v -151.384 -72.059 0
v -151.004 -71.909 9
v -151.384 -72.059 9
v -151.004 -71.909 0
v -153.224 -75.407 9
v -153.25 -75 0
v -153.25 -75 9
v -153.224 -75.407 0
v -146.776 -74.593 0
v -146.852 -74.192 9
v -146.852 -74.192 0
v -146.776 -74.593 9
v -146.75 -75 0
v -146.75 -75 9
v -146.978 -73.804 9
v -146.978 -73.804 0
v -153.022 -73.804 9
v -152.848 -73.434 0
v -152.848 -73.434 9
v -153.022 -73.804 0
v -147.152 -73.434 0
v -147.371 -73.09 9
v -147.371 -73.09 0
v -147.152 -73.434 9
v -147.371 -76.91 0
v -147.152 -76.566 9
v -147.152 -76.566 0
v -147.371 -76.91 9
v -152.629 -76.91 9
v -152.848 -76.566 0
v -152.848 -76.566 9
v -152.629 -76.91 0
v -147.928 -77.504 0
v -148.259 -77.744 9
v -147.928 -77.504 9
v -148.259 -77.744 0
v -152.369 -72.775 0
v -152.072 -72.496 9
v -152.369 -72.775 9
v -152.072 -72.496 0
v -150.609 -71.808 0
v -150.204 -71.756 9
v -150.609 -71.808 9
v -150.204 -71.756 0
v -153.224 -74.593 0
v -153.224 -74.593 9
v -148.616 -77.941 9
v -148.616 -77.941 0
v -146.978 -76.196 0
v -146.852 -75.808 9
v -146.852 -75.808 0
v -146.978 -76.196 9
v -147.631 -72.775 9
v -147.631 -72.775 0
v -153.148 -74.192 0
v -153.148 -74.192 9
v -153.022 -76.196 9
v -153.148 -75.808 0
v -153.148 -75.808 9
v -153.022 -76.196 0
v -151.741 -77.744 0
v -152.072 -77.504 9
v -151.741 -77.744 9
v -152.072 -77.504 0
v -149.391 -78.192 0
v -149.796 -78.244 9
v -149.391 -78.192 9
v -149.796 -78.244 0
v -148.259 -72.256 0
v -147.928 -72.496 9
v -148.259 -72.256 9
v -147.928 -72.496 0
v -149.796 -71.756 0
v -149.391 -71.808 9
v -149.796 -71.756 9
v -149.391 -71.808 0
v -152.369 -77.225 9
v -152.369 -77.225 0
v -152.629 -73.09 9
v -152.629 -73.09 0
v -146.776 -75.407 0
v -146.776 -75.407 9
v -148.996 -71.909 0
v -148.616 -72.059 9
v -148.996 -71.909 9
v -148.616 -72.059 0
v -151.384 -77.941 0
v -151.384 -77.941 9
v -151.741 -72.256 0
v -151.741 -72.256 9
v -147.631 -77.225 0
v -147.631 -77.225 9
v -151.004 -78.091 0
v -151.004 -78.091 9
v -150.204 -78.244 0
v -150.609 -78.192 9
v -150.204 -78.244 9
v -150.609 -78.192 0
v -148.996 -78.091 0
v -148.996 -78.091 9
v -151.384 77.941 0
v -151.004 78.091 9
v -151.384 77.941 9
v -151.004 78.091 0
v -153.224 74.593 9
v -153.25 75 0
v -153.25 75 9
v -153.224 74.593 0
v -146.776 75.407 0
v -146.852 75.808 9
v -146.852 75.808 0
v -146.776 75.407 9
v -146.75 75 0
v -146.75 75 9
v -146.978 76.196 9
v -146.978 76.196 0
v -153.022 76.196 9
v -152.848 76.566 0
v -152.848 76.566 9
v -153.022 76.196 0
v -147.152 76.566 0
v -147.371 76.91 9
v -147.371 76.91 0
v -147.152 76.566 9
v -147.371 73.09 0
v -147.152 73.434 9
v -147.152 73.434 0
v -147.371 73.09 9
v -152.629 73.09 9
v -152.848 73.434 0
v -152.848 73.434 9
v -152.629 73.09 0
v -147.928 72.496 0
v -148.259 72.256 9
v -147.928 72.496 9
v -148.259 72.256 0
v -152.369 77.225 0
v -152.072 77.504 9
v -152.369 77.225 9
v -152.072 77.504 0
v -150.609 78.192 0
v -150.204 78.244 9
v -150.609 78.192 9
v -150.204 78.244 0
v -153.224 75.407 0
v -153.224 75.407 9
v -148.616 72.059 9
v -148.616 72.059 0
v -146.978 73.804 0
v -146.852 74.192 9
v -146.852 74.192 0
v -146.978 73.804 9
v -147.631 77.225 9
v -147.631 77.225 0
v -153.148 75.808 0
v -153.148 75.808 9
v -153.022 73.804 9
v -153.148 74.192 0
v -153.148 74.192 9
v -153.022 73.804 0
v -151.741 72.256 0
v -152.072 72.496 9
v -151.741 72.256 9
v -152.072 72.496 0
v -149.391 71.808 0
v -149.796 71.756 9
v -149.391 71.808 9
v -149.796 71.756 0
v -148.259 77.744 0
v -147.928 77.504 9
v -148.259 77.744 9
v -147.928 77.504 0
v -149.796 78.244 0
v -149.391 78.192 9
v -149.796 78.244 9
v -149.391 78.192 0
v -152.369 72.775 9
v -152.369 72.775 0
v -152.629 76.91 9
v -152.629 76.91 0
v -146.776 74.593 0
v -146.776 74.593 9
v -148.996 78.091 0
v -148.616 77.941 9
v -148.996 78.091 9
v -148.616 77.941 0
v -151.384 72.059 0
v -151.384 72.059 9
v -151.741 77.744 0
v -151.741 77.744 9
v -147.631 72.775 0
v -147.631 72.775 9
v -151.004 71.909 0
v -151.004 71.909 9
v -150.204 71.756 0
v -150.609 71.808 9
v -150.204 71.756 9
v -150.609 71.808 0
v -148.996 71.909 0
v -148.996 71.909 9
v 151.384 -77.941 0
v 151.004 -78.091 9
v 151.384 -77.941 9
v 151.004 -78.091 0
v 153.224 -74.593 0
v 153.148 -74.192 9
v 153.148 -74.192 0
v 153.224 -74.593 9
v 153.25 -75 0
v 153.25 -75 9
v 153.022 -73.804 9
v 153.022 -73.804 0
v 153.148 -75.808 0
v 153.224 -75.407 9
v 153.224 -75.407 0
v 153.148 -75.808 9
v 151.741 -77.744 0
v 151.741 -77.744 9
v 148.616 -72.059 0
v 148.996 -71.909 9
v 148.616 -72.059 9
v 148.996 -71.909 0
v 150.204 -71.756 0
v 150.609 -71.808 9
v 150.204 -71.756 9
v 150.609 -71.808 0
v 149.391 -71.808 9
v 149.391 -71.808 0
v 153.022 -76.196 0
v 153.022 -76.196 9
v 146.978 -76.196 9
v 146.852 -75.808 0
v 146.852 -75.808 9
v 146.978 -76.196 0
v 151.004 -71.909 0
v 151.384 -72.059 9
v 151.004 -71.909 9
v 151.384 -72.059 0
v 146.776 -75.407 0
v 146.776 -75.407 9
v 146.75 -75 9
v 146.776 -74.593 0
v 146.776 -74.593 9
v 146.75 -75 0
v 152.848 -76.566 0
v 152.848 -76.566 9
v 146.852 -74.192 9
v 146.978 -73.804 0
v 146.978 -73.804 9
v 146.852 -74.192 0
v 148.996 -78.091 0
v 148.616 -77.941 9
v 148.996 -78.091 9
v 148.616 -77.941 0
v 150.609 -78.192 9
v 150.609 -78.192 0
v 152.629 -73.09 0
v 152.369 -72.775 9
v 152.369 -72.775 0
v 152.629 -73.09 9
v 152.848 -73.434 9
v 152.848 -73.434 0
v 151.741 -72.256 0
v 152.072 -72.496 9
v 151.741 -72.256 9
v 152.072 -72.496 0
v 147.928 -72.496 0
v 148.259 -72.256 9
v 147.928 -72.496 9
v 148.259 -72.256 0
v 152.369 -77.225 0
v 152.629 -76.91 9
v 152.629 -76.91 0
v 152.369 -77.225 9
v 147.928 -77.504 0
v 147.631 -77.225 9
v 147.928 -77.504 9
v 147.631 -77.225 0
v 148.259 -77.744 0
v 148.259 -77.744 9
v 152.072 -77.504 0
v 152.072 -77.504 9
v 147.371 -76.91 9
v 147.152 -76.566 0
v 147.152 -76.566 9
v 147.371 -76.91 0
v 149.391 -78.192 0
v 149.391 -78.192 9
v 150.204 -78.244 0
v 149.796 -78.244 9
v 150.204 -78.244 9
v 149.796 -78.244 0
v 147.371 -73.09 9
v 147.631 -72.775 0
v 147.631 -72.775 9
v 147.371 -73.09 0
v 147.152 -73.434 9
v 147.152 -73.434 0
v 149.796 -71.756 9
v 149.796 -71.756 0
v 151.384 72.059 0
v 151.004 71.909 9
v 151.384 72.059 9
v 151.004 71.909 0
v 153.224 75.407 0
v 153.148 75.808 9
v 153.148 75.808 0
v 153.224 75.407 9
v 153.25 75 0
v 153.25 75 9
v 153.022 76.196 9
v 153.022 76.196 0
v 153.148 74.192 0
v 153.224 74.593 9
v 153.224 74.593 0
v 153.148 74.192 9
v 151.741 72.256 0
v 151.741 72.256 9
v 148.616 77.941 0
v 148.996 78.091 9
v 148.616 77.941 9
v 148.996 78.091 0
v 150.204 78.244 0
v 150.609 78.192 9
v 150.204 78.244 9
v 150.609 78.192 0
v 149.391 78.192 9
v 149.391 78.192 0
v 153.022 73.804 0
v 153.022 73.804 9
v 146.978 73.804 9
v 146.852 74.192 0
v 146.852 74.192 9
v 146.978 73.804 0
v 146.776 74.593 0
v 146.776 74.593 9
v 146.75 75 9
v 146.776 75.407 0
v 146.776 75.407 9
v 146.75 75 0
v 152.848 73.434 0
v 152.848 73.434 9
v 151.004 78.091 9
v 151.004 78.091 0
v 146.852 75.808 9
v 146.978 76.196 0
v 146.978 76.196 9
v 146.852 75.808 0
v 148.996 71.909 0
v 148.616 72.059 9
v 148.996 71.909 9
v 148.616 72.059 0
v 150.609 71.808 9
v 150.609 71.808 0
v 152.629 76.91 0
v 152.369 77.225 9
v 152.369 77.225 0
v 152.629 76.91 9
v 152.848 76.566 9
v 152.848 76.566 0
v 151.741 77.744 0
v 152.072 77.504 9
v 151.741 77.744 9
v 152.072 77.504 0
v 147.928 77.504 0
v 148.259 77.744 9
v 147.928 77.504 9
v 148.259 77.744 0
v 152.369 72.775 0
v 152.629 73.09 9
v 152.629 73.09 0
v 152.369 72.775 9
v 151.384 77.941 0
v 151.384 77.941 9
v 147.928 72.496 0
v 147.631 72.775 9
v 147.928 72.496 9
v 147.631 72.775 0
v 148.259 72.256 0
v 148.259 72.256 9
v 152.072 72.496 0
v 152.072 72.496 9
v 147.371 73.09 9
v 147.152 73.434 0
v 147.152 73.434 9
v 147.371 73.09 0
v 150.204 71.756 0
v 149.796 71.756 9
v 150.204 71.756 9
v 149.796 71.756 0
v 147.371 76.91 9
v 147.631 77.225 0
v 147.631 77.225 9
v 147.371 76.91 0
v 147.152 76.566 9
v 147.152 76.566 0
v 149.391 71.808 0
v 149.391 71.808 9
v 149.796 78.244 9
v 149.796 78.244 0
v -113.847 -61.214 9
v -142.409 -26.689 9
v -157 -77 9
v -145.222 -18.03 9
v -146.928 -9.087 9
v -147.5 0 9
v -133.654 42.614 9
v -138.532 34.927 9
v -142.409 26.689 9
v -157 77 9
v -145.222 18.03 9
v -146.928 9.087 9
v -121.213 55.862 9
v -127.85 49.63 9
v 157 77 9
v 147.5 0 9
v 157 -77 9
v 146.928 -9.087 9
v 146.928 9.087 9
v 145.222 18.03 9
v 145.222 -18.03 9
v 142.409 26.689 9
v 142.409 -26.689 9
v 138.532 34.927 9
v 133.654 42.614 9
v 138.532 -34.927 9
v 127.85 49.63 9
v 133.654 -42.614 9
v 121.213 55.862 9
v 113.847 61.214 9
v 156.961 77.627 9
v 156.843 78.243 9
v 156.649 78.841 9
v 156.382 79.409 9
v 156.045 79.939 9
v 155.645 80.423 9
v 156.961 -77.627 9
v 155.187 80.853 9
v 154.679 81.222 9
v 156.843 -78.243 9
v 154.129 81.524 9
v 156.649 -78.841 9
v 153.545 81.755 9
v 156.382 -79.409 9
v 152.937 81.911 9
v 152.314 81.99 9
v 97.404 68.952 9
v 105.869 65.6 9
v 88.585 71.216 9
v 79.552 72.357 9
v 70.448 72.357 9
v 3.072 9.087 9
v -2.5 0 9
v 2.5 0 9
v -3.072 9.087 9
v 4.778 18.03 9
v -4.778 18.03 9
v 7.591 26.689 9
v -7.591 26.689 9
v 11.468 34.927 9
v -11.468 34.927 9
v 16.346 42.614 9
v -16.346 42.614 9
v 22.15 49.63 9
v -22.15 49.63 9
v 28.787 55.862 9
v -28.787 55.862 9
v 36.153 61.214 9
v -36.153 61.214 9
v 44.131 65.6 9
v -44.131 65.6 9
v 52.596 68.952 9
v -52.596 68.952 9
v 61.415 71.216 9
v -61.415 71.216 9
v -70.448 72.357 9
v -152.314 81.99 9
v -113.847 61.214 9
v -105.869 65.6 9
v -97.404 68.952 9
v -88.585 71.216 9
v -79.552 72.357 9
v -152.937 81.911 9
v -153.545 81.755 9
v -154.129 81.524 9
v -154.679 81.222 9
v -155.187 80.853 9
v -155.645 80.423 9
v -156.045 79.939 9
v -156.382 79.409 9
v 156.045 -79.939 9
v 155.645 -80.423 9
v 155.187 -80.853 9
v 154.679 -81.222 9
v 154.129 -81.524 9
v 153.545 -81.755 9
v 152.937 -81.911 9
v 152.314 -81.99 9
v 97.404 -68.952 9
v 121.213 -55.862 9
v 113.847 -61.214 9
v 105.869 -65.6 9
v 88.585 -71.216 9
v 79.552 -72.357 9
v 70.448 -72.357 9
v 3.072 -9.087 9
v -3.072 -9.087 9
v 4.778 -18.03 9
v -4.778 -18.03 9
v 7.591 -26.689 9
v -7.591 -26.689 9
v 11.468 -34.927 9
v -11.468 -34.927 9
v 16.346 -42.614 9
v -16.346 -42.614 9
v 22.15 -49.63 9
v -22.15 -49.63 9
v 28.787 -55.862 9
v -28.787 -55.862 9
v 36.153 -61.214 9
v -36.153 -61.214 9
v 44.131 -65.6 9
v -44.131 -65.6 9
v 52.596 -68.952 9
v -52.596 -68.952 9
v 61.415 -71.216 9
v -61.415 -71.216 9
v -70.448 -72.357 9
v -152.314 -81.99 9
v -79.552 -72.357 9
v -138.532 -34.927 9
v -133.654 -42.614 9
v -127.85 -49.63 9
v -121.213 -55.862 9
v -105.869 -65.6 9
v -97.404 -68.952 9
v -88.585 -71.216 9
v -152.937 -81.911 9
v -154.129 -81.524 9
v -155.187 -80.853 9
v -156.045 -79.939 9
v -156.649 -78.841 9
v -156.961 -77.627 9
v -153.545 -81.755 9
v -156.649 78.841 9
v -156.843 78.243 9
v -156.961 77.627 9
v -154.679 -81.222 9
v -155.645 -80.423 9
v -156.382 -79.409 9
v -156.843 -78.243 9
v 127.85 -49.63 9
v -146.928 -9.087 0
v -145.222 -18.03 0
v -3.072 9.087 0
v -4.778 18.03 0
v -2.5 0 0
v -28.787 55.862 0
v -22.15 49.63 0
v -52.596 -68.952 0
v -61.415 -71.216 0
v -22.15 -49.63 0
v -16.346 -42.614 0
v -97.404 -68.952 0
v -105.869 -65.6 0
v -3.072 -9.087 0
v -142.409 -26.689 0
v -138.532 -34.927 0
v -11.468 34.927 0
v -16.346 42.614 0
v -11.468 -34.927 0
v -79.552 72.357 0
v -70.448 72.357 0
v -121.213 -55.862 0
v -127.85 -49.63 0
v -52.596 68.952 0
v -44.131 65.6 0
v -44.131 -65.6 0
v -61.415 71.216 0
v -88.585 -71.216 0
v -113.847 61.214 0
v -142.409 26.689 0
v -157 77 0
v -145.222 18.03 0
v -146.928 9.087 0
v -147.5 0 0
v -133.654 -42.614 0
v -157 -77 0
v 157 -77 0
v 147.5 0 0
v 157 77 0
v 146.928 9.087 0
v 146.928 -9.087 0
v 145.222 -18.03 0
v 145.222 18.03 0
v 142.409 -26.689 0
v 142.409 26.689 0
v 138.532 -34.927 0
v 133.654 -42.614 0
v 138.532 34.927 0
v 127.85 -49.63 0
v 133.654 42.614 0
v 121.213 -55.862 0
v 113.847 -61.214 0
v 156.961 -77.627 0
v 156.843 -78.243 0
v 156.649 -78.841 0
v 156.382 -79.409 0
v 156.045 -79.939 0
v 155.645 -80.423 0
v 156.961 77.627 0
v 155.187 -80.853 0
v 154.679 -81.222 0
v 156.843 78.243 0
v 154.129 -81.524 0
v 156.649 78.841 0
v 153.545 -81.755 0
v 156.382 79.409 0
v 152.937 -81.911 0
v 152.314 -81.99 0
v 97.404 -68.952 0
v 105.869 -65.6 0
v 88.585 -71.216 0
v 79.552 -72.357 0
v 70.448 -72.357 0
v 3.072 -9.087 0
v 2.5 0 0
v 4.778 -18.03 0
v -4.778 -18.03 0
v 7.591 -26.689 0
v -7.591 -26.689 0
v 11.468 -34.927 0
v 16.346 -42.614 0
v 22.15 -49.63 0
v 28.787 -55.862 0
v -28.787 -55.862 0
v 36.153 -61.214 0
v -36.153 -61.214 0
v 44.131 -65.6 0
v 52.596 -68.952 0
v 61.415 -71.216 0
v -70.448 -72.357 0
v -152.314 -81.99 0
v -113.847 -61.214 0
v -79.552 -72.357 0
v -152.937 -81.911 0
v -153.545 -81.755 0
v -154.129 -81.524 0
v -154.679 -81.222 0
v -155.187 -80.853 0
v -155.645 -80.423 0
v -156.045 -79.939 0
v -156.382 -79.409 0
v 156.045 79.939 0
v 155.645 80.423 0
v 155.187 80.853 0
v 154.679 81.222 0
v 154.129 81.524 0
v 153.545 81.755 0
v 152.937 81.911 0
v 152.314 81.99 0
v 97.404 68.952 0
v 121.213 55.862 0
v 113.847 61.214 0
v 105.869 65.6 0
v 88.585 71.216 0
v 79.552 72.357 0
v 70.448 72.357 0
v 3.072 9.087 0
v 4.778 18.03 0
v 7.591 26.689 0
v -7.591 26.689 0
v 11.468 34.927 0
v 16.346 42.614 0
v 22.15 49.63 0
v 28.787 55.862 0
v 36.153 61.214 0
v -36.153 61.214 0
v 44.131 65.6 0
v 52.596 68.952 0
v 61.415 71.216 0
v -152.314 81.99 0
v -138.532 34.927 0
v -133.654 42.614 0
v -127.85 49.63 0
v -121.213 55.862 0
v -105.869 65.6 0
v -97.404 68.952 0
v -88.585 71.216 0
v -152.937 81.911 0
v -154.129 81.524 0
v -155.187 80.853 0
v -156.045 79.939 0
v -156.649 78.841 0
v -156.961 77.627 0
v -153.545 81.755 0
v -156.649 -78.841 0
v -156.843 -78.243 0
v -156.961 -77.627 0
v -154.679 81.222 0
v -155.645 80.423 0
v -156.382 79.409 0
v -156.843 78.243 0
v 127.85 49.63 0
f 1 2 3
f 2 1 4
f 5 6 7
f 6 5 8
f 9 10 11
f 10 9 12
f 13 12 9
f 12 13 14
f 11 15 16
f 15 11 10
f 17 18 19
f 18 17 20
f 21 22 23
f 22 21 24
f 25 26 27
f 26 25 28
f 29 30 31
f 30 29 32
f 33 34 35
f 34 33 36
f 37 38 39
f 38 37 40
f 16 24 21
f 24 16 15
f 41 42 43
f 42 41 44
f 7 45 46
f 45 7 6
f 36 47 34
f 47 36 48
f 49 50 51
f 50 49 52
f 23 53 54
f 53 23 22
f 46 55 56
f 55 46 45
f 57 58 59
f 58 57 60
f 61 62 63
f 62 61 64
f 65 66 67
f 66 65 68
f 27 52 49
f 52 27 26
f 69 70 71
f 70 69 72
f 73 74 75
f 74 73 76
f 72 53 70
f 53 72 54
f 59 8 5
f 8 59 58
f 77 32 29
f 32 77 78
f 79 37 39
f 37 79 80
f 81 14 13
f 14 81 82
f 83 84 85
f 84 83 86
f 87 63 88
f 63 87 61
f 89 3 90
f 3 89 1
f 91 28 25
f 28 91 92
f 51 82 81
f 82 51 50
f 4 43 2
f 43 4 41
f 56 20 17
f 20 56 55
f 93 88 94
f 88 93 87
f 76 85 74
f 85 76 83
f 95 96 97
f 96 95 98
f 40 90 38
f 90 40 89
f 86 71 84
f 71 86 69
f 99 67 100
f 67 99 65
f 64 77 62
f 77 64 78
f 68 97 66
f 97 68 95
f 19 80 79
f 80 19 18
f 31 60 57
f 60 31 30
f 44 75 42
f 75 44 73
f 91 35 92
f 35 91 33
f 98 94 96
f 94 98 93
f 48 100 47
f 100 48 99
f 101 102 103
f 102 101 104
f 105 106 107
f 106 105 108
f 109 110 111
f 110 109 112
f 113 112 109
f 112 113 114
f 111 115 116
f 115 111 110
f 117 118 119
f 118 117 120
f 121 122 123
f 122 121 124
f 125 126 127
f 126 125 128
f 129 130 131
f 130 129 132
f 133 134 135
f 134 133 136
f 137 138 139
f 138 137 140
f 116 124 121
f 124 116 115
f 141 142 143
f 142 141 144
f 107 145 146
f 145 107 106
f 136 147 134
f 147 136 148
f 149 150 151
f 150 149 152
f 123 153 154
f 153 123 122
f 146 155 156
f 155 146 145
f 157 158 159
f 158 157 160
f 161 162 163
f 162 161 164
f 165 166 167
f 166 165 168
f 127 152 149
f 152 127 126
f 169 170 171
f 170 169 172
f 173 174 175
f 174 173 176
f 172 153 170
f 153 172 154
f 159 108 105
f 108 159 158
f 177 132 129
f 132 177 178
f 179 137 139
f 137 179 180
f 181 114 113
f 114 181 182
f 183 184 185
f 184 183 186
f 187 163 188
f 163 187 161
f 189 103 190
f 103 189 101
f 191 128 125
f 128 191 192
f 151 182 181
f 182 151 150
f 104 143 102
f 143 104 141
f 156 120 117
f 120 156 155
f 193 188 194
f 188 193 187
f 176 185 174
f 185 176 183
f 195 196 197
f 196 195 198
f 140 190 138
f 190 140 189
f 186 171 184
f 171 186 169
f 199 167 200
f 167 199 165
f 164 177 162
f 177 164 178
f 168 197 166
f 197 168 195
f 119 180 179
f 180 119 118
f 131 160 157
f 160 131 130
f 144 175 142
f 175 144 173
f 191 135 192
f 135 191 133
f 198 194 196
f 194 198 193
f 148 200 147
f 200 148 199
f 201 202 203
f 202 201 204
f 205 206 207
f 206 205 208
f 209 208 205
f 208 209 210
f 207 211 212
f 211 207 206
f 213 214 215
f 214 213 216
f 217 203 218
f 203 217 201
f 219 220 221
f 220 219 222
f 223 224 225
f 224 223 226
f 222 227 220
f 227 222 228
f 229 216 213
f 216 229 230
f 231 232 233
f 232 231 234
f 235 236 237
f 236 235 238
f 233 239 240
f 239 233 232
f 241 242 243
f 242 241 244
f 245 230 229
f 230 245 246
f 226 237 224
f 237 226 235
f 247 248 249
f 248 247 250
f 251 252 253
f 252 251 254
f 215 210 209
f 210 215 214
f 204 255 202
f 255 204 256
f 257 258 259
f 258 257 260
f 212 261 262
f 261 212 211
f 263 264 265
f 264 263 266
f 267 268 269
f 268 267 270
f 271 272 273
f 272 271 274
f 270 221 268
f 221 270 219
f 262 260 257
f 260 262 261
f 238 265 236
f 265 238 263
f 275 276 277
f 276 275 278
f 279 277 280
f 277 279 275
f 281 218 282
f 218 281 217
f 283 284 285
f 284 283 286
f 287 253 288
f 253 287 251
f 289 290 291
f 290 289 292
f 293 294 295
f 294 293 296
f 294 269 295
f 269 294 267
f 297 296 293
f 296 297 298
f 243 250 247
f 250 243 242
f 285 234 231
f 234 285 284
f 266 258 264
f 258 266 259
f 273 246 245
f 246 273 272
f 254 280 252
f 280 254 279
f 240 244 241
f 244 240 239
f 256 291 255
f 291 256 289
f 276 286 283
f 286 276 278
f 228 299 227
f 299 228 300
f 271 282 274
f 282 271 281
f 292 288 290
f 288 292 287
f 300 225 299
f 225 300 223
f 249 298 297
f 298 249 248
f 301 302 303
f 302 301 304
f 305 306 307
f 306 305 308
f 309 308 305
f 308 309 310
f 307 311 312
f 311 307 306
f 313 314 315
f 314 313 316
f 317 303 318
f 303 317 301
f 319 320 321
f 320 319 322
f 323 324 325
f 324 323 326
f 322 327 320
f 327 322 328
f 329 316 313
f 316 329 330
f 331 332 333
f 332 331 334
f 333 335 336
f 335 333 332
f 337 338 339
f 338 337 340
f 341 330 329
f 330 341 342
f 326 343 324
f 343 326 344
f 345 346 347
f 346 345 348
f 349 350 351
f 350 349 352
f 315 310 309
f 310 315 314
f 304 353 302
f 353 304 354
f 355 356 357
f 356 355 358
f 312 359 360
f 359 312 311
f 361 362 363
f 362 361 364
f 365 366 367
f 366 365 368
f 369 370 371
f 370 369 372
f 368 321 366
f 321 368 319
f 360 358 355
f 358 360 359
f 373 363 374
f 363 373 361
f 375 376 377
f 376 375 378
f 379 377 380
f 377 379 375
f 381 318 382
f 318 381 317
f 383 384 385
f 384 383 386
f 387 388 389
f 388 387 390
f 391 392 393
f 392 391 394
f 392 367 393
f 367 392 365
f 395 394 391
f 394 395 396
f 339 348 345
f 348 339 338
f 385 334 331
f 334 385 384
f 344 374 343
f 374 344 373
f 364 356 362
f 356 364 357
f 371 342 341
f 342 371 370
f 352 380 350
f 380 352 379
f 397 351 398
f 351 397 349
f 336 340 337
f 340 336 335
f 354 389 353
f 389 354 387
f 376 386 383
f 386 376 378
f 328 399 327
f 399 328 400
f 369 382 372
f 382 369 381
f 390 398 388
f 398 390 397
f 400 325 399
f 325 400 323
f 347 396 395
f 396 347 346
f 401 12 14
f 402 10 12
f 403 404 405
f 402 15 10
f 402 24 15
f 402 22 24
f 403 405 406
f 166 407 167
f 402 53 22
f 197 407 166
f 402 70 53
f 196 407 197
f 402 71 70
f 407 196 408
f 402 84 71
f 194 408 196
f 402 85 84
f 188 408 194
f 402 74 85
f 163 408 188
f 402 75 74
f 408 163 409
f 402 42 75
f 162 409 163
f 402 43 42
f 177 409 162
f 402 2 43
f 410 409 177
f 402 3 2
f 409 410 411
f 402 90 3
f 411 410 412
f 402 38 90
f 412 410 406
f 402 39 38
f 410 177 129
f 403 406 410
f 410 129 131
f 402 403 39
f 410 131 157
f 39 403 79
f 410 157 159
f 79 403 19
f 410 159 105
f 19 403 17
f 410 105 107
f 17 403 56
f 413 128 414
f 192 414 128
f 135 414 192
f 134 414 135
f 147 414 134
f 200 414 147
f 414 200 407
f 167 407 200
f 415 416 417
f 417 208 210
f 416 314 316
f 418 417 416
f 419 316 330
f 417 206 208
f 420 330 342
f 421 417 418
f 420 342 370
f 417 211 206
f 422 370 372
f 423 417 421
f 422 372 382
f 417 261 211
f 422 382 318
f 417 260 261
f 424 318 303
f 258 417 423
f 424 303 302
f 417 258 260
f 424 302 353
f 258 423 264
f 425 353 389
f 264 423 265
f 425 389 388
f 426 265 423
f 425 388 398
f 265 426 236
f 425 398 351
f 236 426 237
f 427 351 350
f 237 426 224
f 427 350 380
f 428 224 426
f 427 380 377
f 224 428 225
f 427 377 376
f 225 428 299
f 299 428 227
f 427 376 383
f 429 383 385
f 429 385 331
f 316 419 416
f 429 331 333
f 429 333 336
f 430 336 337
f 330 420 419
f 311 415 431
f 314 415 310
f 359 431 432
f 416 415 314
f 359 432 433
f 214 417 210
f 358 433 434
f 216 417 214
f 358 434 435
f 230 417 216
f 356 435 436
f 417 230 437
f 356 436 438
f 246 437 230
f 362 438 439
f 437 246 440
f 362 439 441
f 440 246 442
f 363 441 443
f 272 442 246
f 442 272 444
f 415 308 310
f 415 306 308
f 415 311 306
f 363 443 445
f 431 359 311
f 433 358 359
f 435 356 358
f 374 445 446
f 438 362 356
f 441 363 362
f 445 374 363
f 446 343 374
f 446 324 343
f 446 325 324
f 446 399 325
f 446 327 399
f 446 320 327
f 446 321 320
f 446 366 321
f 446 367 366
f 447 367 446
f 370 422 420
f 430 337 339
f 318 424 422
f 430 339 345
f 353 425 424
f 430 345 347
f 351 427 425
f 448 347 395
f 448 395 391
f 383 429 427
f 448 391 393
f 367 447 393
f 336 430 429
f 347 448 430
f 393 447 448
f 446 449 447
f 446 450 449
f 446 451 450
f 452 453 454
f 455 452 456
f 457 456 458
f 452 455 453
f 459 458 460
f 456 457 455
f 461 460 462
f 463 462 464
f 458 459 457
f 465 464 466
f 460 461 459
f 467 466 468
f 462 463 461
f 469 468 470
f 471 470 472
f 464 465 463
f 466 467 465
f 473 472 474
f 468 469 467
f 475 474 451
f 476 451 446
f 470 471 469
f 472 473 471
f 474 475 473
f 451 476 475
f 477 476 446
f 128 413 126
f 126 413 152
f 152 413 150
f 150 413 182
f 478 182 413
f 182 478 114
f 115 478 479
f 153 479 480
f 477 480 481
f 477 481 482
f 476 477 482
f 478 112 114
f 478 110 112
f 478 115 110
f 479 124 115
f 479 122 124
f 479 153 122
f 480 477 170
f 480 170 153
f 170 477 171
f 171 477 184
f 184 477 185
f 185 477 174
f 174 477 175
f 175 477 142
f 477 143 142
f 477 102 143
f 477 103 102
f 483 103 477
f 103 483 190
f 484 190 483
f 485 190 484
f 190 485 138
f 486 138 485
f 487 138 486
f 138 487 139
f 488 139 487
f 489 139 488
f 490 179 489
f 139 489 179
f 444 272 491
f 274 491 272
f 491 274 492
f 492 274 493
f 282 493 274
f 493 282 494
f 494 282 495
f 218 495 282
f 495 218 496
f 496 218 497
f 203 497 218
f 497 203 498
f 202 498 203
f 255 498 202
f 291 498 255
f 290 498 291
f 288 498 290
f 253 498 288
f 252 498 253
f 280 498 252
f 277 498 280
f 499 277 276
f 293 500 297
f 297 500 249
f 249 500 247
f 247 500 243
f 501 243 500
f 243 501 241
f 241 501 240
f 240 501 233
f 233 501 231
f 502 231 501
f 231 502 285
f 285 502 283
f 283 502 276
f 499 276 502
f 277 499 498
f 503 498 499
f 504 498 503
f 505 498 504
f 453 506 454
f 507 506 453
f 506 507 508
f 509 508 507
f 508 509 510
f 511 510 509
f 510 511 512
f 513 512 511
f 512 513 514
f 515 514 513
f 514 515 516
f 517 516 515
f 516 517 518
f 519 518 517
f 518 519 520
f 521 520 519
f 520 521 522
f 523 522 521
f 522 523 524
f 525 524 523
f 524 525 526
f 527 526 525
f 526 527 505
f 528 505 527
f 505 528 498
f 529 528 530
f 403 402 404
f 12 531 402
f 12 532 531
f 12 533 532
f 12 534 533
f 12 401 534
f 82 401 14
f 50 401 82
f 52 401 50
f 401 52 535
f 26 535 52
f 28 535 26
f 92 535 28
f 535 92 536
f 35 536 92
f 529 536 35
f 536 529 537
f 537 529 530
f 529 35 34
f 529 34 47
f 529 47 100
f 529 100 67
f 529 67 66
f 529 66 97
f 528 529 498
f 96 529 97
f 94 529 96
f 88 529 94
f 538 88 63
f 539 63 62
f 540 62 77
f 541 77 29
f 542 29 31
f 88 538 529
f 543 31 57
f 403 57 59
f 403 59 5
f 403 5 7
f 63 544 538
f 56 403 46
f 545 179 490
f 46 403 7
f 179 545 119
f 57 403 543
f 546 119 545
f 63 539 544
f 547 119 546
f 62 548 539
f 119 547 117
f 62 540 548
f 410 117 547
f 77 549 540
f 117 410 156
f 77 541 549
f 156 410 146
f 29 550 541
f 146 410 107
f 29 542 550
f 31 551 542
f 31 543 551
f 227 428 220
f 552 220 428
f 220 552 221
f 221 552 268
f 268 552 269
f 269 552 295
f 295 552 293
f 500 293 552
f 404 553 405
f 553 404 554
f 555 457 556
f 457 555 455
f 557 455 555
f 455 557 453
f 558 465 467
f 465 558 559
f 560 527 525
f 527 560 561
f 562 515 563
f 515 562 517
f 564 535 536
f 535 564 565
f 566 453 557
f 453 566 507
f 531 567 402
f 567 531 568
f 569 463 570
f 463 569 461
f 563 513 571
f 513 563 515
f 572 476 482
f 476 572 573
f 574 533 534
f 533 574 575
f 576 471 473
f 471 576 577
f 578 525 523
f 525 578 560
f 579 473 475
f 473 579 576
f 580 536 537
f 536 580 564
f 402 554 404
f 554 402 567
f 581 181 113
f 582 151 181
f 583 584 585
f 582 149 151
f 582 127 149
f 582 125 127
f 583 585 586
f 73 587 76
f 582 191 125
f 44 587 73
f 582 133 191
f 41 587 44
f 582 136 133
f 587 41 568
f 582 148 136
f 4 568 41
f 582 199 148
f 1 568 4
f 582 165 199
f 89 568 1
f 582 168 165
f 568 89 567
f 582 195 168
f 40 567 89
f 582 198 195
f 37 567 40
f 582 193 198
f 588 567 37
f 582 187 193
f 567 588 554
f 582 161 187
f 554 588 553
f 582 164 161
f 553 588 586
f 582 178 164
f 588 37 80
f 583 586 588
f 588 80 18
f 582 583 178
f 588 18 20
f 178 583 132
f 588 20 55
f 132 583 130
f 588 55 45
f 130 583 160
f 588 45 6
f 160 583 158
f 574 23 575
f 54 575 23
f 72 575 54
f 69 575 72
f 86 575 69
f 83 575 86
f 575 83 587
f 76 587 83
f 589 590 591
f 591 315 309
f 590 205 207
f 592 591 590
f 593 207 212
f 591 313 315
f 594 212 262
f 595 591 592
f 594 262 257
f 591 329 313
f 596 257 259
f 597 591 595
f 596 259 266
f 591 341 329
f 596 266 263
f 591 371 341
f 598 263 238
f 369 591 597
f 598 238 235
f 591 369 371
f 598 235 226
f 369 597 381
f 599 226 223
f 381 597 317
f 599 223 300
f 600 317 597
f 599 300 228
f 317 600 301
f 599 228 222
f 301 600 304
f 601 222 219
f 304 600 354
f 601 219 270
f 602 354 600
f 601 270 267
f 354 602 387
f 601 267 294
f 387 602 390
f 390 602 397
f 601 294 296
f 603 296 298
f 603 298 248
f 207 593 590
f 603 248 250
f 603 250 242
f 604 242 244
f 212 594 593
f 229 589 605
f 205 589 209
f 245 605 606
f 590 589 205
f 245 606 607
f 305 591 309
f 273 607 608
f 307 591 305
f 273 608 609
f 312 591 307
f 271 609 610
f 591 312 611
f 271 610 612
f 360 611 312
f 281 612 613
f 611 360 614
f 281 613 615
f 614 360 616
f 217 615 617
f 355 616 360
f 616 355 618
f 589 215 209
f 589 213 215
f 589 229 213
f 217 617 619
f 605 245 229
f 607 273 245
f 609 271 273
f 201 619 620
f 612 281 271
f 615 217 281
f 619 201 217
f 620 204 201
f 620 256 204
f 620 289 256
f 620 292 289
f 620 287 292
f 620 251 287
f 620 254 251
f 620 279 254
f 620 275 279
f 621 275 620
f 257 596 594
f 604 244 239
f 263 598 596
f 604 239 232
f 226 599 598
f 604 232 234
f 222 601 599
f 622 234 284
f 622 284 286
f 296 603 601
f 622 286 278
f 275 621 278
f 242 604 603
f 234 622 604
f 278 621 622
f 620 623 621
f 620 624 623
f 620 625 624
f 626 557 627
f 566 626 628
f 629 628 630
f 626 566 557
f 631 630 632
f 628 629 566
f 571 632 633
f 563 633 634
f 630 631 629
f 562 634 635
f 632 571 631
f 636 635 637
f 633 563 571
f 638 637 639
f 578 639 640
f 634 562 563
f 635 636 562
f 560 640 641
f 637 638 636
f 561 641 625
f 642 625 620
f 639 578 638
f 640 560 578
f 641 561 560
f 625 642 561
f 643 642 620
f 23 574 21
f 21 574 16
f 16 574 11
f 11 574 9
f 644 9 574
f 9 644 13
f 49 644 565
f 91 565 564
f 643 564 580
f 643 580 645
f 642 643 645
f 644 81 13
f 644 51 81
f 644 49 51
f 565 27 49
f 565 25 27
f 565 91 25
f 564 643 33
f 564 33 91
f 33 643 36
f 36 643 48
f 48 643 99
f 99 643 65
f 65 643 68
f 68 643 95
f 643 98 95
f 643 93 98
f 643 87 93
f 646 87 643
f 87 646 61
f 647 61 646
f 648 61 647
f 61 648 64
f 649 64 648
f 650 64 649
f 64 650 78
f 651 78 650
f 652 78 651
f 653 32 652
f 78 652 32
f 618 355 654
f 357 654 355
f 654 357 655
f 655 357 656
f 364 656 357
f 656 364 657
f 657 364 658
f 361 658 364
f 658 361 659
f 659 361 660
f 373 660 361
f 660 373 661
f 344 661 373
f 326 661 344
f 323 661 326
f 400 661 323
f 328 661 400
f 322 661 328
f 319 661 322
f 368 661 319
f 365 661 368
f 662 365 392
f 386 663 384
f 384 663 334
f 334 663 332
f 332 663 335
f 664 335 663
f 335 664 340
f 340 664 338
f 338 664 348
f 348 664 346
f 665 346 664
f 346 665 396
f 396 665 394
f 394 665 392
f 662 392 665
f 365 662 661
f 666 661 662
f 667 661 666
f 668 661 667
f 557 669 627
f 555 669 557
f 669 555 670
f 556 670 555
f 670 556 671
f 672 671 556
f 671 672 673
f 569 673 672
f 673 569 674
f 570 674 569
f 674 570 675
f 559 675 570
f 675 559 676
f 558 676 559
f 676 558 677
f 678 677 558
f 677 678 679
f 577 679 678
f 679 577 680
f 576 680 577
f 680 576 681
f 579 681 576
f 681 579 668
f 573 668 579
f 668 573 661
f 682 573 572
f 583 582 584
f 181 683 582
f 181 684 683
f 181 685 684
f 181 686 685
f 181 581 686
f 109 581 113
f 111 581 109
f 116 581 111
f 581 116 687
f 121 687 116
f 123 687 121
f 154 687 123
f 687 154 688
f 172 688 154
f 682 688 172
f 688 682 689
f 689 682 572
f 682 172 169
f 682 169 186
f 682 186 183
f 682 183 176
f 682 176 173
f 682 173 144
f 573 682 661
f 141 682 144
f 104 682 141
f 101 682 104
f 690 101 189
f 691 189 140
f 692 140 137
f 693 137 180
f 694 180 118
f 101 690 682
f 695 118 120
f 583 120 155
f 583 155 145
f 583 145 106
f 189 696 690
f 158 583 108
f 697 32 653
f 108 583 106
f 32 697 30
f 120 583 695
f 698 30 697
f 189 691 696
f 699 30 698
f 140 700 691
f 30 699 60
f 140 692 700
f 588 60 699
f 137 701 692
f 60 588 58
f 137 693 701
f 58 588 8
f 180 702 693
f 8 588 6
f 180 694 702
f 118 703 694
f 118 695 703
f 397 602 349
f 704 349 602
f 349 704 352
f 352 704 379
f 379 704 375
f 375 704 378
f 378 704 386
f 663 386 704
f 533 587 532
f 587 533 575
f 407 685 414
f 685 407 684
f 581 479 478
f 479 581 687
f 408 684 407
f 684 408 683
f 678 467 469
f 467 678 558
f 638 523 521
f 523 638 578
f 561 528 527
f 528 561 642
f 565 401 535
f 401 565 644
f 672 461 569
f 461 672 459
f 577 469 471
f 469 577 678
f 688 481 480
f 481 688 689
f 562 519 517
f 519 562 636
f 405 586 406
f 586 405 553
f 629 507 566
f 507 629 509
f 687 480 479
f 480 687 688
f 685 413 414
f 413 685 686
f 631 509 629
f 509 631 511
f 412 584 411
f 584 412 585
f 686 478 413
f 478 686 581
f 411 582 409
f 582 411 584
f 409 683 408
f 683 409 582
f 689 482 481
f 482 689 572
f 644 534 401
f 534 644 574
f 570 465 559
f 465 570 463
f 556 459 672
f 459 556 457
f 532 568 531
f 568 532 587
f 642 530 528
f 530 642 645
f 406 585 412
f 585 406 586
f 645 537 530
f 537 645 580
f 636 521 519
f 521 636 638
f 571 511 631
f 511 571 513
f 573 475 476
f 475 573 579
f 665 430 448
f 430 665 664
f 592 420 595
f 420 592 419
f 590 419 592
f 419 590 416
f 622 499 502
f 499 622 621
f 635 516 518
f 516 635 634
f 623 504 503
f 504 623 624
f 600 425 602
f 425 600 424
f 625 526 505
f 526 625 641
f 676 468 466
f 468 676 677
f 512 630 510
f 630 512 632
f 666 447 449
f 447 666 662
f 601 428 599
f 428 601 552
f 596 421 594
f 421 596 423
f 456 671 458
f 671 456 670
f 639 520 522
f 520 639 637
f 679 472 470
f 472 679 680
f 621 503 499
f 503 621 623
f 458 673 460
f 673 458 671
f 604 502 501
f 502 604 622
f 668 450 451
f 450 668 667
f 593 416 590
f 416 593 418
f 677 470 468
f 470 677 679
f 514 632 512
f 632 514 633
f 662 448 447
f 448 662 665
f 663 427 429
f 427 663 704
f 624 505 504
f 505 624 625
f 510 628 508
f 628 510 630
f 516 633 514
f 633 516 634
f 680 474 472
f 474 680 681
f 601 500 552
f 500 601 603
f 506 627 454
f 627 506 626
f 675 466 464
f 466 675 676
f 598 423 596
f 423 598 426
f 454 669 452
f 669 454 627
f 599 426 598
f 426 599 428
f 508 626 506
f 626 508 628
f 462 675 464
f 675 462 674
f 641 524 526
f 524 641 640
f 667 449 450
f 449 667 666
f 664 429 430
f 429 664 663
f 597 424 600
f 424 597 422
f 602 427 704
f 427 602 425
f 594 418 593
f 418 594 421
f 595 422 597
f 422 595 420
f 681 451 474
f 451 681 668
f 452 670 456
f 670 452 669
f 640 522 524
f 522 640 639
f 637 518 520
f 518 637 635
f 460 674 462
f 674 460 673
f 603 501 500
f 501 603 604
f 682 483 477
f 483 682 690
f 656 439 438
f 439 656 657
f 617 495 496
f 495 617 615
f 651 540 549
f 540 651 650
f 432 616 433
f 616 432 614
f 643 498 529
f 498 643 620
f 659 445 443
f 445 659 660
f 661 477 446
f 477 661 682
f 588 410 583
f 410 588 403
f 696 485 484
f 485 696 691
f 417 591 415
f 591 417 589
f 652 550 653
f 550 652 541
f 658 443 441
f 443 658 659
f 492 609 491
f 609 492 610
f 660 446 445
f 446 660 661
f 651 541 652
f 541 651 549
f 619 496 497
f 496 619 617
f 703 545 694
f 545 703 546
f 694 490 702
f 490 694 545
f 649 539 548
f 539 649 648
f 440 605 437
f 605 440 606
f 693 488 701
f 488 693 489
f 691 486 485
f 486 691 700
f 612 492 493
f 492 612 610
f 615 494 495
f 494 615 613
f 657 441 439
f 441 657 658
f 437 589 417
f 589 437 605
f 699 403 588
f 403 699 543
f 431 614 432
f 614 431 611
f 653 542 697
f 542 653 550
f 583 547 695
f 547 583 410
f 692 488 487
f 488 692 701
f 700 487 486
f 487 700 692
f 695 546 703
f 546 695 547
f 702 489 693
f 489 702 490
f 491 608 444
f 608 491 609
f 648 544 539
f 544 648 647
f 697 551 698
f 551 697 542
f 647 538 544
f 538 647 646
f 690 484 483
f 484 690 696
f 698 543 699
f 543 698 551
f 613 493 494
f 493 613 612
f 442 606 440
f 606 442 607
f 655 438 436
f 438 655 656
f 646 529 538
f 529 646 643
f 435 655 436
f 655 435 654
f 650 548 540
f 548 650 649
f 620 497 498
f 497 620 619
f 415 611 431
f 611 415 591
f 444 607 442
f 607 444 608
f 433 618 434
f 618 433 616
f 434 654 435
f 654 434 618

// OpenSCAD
$fn = 50;

difference() {
	union() {
		hull() {
			translate(v = [-152.0, 77.0, 0]) {
				cylinder(h = 9, r = 5);
			}
			translate(v = [152.0, 77.0, 0]) {
				cylinder(h = 9, r = 5);
			}
			translate(v = [-152.0, -77.0, 0]) {
				cylinder(h = 9, r = 5);
			}
			translate(v = [152.0, -77.0, 0]) {
				cylinder(h = 9, r = 5);
			}
		}
	}
	union() {
		translate(v = [-150.0, -75.0, -100.0]) {
			cylinder(h = 200, r = 3.25);
		}
		translate(v = [-150.0, 75.0, -100.0]) {
			cylinder(h = 200, r = 3.25);
		}
		translate(v = [150.0, -75.0, -100.0]) {
			cylinder(h = 200, r = 3.25);
		}
		translate(v = [150.0, 75.0, -100.0]) {
			cylinder(h = 200, r = 3.25);
		}
		translate(v = [-150.0, -75.0, -100.0]) {
			cylinder(h = 200, r = 1.8);
		}
		translate(v = [-150.0, 75.0, -100.0]) {
			cylinder(h = 200, r = 1.8);
		}
		translate(v = [150.0, -75.0, -100.0]) {
			cylinder(h = 200, r = 1.8);
		}
		translate(v = [150.0, 75.0, -100.0]) {
			cylinder(h = 200, r = 1.8);
		}
		translate(v = [-75.0, 0, 0.0]) {
			cylinder(h = 9, r = 72.5);
		}
		translate(v = [75.0, 0, 0.0]) {
			cylinder(h = 9, r = 72.5);
		}
	}
}
